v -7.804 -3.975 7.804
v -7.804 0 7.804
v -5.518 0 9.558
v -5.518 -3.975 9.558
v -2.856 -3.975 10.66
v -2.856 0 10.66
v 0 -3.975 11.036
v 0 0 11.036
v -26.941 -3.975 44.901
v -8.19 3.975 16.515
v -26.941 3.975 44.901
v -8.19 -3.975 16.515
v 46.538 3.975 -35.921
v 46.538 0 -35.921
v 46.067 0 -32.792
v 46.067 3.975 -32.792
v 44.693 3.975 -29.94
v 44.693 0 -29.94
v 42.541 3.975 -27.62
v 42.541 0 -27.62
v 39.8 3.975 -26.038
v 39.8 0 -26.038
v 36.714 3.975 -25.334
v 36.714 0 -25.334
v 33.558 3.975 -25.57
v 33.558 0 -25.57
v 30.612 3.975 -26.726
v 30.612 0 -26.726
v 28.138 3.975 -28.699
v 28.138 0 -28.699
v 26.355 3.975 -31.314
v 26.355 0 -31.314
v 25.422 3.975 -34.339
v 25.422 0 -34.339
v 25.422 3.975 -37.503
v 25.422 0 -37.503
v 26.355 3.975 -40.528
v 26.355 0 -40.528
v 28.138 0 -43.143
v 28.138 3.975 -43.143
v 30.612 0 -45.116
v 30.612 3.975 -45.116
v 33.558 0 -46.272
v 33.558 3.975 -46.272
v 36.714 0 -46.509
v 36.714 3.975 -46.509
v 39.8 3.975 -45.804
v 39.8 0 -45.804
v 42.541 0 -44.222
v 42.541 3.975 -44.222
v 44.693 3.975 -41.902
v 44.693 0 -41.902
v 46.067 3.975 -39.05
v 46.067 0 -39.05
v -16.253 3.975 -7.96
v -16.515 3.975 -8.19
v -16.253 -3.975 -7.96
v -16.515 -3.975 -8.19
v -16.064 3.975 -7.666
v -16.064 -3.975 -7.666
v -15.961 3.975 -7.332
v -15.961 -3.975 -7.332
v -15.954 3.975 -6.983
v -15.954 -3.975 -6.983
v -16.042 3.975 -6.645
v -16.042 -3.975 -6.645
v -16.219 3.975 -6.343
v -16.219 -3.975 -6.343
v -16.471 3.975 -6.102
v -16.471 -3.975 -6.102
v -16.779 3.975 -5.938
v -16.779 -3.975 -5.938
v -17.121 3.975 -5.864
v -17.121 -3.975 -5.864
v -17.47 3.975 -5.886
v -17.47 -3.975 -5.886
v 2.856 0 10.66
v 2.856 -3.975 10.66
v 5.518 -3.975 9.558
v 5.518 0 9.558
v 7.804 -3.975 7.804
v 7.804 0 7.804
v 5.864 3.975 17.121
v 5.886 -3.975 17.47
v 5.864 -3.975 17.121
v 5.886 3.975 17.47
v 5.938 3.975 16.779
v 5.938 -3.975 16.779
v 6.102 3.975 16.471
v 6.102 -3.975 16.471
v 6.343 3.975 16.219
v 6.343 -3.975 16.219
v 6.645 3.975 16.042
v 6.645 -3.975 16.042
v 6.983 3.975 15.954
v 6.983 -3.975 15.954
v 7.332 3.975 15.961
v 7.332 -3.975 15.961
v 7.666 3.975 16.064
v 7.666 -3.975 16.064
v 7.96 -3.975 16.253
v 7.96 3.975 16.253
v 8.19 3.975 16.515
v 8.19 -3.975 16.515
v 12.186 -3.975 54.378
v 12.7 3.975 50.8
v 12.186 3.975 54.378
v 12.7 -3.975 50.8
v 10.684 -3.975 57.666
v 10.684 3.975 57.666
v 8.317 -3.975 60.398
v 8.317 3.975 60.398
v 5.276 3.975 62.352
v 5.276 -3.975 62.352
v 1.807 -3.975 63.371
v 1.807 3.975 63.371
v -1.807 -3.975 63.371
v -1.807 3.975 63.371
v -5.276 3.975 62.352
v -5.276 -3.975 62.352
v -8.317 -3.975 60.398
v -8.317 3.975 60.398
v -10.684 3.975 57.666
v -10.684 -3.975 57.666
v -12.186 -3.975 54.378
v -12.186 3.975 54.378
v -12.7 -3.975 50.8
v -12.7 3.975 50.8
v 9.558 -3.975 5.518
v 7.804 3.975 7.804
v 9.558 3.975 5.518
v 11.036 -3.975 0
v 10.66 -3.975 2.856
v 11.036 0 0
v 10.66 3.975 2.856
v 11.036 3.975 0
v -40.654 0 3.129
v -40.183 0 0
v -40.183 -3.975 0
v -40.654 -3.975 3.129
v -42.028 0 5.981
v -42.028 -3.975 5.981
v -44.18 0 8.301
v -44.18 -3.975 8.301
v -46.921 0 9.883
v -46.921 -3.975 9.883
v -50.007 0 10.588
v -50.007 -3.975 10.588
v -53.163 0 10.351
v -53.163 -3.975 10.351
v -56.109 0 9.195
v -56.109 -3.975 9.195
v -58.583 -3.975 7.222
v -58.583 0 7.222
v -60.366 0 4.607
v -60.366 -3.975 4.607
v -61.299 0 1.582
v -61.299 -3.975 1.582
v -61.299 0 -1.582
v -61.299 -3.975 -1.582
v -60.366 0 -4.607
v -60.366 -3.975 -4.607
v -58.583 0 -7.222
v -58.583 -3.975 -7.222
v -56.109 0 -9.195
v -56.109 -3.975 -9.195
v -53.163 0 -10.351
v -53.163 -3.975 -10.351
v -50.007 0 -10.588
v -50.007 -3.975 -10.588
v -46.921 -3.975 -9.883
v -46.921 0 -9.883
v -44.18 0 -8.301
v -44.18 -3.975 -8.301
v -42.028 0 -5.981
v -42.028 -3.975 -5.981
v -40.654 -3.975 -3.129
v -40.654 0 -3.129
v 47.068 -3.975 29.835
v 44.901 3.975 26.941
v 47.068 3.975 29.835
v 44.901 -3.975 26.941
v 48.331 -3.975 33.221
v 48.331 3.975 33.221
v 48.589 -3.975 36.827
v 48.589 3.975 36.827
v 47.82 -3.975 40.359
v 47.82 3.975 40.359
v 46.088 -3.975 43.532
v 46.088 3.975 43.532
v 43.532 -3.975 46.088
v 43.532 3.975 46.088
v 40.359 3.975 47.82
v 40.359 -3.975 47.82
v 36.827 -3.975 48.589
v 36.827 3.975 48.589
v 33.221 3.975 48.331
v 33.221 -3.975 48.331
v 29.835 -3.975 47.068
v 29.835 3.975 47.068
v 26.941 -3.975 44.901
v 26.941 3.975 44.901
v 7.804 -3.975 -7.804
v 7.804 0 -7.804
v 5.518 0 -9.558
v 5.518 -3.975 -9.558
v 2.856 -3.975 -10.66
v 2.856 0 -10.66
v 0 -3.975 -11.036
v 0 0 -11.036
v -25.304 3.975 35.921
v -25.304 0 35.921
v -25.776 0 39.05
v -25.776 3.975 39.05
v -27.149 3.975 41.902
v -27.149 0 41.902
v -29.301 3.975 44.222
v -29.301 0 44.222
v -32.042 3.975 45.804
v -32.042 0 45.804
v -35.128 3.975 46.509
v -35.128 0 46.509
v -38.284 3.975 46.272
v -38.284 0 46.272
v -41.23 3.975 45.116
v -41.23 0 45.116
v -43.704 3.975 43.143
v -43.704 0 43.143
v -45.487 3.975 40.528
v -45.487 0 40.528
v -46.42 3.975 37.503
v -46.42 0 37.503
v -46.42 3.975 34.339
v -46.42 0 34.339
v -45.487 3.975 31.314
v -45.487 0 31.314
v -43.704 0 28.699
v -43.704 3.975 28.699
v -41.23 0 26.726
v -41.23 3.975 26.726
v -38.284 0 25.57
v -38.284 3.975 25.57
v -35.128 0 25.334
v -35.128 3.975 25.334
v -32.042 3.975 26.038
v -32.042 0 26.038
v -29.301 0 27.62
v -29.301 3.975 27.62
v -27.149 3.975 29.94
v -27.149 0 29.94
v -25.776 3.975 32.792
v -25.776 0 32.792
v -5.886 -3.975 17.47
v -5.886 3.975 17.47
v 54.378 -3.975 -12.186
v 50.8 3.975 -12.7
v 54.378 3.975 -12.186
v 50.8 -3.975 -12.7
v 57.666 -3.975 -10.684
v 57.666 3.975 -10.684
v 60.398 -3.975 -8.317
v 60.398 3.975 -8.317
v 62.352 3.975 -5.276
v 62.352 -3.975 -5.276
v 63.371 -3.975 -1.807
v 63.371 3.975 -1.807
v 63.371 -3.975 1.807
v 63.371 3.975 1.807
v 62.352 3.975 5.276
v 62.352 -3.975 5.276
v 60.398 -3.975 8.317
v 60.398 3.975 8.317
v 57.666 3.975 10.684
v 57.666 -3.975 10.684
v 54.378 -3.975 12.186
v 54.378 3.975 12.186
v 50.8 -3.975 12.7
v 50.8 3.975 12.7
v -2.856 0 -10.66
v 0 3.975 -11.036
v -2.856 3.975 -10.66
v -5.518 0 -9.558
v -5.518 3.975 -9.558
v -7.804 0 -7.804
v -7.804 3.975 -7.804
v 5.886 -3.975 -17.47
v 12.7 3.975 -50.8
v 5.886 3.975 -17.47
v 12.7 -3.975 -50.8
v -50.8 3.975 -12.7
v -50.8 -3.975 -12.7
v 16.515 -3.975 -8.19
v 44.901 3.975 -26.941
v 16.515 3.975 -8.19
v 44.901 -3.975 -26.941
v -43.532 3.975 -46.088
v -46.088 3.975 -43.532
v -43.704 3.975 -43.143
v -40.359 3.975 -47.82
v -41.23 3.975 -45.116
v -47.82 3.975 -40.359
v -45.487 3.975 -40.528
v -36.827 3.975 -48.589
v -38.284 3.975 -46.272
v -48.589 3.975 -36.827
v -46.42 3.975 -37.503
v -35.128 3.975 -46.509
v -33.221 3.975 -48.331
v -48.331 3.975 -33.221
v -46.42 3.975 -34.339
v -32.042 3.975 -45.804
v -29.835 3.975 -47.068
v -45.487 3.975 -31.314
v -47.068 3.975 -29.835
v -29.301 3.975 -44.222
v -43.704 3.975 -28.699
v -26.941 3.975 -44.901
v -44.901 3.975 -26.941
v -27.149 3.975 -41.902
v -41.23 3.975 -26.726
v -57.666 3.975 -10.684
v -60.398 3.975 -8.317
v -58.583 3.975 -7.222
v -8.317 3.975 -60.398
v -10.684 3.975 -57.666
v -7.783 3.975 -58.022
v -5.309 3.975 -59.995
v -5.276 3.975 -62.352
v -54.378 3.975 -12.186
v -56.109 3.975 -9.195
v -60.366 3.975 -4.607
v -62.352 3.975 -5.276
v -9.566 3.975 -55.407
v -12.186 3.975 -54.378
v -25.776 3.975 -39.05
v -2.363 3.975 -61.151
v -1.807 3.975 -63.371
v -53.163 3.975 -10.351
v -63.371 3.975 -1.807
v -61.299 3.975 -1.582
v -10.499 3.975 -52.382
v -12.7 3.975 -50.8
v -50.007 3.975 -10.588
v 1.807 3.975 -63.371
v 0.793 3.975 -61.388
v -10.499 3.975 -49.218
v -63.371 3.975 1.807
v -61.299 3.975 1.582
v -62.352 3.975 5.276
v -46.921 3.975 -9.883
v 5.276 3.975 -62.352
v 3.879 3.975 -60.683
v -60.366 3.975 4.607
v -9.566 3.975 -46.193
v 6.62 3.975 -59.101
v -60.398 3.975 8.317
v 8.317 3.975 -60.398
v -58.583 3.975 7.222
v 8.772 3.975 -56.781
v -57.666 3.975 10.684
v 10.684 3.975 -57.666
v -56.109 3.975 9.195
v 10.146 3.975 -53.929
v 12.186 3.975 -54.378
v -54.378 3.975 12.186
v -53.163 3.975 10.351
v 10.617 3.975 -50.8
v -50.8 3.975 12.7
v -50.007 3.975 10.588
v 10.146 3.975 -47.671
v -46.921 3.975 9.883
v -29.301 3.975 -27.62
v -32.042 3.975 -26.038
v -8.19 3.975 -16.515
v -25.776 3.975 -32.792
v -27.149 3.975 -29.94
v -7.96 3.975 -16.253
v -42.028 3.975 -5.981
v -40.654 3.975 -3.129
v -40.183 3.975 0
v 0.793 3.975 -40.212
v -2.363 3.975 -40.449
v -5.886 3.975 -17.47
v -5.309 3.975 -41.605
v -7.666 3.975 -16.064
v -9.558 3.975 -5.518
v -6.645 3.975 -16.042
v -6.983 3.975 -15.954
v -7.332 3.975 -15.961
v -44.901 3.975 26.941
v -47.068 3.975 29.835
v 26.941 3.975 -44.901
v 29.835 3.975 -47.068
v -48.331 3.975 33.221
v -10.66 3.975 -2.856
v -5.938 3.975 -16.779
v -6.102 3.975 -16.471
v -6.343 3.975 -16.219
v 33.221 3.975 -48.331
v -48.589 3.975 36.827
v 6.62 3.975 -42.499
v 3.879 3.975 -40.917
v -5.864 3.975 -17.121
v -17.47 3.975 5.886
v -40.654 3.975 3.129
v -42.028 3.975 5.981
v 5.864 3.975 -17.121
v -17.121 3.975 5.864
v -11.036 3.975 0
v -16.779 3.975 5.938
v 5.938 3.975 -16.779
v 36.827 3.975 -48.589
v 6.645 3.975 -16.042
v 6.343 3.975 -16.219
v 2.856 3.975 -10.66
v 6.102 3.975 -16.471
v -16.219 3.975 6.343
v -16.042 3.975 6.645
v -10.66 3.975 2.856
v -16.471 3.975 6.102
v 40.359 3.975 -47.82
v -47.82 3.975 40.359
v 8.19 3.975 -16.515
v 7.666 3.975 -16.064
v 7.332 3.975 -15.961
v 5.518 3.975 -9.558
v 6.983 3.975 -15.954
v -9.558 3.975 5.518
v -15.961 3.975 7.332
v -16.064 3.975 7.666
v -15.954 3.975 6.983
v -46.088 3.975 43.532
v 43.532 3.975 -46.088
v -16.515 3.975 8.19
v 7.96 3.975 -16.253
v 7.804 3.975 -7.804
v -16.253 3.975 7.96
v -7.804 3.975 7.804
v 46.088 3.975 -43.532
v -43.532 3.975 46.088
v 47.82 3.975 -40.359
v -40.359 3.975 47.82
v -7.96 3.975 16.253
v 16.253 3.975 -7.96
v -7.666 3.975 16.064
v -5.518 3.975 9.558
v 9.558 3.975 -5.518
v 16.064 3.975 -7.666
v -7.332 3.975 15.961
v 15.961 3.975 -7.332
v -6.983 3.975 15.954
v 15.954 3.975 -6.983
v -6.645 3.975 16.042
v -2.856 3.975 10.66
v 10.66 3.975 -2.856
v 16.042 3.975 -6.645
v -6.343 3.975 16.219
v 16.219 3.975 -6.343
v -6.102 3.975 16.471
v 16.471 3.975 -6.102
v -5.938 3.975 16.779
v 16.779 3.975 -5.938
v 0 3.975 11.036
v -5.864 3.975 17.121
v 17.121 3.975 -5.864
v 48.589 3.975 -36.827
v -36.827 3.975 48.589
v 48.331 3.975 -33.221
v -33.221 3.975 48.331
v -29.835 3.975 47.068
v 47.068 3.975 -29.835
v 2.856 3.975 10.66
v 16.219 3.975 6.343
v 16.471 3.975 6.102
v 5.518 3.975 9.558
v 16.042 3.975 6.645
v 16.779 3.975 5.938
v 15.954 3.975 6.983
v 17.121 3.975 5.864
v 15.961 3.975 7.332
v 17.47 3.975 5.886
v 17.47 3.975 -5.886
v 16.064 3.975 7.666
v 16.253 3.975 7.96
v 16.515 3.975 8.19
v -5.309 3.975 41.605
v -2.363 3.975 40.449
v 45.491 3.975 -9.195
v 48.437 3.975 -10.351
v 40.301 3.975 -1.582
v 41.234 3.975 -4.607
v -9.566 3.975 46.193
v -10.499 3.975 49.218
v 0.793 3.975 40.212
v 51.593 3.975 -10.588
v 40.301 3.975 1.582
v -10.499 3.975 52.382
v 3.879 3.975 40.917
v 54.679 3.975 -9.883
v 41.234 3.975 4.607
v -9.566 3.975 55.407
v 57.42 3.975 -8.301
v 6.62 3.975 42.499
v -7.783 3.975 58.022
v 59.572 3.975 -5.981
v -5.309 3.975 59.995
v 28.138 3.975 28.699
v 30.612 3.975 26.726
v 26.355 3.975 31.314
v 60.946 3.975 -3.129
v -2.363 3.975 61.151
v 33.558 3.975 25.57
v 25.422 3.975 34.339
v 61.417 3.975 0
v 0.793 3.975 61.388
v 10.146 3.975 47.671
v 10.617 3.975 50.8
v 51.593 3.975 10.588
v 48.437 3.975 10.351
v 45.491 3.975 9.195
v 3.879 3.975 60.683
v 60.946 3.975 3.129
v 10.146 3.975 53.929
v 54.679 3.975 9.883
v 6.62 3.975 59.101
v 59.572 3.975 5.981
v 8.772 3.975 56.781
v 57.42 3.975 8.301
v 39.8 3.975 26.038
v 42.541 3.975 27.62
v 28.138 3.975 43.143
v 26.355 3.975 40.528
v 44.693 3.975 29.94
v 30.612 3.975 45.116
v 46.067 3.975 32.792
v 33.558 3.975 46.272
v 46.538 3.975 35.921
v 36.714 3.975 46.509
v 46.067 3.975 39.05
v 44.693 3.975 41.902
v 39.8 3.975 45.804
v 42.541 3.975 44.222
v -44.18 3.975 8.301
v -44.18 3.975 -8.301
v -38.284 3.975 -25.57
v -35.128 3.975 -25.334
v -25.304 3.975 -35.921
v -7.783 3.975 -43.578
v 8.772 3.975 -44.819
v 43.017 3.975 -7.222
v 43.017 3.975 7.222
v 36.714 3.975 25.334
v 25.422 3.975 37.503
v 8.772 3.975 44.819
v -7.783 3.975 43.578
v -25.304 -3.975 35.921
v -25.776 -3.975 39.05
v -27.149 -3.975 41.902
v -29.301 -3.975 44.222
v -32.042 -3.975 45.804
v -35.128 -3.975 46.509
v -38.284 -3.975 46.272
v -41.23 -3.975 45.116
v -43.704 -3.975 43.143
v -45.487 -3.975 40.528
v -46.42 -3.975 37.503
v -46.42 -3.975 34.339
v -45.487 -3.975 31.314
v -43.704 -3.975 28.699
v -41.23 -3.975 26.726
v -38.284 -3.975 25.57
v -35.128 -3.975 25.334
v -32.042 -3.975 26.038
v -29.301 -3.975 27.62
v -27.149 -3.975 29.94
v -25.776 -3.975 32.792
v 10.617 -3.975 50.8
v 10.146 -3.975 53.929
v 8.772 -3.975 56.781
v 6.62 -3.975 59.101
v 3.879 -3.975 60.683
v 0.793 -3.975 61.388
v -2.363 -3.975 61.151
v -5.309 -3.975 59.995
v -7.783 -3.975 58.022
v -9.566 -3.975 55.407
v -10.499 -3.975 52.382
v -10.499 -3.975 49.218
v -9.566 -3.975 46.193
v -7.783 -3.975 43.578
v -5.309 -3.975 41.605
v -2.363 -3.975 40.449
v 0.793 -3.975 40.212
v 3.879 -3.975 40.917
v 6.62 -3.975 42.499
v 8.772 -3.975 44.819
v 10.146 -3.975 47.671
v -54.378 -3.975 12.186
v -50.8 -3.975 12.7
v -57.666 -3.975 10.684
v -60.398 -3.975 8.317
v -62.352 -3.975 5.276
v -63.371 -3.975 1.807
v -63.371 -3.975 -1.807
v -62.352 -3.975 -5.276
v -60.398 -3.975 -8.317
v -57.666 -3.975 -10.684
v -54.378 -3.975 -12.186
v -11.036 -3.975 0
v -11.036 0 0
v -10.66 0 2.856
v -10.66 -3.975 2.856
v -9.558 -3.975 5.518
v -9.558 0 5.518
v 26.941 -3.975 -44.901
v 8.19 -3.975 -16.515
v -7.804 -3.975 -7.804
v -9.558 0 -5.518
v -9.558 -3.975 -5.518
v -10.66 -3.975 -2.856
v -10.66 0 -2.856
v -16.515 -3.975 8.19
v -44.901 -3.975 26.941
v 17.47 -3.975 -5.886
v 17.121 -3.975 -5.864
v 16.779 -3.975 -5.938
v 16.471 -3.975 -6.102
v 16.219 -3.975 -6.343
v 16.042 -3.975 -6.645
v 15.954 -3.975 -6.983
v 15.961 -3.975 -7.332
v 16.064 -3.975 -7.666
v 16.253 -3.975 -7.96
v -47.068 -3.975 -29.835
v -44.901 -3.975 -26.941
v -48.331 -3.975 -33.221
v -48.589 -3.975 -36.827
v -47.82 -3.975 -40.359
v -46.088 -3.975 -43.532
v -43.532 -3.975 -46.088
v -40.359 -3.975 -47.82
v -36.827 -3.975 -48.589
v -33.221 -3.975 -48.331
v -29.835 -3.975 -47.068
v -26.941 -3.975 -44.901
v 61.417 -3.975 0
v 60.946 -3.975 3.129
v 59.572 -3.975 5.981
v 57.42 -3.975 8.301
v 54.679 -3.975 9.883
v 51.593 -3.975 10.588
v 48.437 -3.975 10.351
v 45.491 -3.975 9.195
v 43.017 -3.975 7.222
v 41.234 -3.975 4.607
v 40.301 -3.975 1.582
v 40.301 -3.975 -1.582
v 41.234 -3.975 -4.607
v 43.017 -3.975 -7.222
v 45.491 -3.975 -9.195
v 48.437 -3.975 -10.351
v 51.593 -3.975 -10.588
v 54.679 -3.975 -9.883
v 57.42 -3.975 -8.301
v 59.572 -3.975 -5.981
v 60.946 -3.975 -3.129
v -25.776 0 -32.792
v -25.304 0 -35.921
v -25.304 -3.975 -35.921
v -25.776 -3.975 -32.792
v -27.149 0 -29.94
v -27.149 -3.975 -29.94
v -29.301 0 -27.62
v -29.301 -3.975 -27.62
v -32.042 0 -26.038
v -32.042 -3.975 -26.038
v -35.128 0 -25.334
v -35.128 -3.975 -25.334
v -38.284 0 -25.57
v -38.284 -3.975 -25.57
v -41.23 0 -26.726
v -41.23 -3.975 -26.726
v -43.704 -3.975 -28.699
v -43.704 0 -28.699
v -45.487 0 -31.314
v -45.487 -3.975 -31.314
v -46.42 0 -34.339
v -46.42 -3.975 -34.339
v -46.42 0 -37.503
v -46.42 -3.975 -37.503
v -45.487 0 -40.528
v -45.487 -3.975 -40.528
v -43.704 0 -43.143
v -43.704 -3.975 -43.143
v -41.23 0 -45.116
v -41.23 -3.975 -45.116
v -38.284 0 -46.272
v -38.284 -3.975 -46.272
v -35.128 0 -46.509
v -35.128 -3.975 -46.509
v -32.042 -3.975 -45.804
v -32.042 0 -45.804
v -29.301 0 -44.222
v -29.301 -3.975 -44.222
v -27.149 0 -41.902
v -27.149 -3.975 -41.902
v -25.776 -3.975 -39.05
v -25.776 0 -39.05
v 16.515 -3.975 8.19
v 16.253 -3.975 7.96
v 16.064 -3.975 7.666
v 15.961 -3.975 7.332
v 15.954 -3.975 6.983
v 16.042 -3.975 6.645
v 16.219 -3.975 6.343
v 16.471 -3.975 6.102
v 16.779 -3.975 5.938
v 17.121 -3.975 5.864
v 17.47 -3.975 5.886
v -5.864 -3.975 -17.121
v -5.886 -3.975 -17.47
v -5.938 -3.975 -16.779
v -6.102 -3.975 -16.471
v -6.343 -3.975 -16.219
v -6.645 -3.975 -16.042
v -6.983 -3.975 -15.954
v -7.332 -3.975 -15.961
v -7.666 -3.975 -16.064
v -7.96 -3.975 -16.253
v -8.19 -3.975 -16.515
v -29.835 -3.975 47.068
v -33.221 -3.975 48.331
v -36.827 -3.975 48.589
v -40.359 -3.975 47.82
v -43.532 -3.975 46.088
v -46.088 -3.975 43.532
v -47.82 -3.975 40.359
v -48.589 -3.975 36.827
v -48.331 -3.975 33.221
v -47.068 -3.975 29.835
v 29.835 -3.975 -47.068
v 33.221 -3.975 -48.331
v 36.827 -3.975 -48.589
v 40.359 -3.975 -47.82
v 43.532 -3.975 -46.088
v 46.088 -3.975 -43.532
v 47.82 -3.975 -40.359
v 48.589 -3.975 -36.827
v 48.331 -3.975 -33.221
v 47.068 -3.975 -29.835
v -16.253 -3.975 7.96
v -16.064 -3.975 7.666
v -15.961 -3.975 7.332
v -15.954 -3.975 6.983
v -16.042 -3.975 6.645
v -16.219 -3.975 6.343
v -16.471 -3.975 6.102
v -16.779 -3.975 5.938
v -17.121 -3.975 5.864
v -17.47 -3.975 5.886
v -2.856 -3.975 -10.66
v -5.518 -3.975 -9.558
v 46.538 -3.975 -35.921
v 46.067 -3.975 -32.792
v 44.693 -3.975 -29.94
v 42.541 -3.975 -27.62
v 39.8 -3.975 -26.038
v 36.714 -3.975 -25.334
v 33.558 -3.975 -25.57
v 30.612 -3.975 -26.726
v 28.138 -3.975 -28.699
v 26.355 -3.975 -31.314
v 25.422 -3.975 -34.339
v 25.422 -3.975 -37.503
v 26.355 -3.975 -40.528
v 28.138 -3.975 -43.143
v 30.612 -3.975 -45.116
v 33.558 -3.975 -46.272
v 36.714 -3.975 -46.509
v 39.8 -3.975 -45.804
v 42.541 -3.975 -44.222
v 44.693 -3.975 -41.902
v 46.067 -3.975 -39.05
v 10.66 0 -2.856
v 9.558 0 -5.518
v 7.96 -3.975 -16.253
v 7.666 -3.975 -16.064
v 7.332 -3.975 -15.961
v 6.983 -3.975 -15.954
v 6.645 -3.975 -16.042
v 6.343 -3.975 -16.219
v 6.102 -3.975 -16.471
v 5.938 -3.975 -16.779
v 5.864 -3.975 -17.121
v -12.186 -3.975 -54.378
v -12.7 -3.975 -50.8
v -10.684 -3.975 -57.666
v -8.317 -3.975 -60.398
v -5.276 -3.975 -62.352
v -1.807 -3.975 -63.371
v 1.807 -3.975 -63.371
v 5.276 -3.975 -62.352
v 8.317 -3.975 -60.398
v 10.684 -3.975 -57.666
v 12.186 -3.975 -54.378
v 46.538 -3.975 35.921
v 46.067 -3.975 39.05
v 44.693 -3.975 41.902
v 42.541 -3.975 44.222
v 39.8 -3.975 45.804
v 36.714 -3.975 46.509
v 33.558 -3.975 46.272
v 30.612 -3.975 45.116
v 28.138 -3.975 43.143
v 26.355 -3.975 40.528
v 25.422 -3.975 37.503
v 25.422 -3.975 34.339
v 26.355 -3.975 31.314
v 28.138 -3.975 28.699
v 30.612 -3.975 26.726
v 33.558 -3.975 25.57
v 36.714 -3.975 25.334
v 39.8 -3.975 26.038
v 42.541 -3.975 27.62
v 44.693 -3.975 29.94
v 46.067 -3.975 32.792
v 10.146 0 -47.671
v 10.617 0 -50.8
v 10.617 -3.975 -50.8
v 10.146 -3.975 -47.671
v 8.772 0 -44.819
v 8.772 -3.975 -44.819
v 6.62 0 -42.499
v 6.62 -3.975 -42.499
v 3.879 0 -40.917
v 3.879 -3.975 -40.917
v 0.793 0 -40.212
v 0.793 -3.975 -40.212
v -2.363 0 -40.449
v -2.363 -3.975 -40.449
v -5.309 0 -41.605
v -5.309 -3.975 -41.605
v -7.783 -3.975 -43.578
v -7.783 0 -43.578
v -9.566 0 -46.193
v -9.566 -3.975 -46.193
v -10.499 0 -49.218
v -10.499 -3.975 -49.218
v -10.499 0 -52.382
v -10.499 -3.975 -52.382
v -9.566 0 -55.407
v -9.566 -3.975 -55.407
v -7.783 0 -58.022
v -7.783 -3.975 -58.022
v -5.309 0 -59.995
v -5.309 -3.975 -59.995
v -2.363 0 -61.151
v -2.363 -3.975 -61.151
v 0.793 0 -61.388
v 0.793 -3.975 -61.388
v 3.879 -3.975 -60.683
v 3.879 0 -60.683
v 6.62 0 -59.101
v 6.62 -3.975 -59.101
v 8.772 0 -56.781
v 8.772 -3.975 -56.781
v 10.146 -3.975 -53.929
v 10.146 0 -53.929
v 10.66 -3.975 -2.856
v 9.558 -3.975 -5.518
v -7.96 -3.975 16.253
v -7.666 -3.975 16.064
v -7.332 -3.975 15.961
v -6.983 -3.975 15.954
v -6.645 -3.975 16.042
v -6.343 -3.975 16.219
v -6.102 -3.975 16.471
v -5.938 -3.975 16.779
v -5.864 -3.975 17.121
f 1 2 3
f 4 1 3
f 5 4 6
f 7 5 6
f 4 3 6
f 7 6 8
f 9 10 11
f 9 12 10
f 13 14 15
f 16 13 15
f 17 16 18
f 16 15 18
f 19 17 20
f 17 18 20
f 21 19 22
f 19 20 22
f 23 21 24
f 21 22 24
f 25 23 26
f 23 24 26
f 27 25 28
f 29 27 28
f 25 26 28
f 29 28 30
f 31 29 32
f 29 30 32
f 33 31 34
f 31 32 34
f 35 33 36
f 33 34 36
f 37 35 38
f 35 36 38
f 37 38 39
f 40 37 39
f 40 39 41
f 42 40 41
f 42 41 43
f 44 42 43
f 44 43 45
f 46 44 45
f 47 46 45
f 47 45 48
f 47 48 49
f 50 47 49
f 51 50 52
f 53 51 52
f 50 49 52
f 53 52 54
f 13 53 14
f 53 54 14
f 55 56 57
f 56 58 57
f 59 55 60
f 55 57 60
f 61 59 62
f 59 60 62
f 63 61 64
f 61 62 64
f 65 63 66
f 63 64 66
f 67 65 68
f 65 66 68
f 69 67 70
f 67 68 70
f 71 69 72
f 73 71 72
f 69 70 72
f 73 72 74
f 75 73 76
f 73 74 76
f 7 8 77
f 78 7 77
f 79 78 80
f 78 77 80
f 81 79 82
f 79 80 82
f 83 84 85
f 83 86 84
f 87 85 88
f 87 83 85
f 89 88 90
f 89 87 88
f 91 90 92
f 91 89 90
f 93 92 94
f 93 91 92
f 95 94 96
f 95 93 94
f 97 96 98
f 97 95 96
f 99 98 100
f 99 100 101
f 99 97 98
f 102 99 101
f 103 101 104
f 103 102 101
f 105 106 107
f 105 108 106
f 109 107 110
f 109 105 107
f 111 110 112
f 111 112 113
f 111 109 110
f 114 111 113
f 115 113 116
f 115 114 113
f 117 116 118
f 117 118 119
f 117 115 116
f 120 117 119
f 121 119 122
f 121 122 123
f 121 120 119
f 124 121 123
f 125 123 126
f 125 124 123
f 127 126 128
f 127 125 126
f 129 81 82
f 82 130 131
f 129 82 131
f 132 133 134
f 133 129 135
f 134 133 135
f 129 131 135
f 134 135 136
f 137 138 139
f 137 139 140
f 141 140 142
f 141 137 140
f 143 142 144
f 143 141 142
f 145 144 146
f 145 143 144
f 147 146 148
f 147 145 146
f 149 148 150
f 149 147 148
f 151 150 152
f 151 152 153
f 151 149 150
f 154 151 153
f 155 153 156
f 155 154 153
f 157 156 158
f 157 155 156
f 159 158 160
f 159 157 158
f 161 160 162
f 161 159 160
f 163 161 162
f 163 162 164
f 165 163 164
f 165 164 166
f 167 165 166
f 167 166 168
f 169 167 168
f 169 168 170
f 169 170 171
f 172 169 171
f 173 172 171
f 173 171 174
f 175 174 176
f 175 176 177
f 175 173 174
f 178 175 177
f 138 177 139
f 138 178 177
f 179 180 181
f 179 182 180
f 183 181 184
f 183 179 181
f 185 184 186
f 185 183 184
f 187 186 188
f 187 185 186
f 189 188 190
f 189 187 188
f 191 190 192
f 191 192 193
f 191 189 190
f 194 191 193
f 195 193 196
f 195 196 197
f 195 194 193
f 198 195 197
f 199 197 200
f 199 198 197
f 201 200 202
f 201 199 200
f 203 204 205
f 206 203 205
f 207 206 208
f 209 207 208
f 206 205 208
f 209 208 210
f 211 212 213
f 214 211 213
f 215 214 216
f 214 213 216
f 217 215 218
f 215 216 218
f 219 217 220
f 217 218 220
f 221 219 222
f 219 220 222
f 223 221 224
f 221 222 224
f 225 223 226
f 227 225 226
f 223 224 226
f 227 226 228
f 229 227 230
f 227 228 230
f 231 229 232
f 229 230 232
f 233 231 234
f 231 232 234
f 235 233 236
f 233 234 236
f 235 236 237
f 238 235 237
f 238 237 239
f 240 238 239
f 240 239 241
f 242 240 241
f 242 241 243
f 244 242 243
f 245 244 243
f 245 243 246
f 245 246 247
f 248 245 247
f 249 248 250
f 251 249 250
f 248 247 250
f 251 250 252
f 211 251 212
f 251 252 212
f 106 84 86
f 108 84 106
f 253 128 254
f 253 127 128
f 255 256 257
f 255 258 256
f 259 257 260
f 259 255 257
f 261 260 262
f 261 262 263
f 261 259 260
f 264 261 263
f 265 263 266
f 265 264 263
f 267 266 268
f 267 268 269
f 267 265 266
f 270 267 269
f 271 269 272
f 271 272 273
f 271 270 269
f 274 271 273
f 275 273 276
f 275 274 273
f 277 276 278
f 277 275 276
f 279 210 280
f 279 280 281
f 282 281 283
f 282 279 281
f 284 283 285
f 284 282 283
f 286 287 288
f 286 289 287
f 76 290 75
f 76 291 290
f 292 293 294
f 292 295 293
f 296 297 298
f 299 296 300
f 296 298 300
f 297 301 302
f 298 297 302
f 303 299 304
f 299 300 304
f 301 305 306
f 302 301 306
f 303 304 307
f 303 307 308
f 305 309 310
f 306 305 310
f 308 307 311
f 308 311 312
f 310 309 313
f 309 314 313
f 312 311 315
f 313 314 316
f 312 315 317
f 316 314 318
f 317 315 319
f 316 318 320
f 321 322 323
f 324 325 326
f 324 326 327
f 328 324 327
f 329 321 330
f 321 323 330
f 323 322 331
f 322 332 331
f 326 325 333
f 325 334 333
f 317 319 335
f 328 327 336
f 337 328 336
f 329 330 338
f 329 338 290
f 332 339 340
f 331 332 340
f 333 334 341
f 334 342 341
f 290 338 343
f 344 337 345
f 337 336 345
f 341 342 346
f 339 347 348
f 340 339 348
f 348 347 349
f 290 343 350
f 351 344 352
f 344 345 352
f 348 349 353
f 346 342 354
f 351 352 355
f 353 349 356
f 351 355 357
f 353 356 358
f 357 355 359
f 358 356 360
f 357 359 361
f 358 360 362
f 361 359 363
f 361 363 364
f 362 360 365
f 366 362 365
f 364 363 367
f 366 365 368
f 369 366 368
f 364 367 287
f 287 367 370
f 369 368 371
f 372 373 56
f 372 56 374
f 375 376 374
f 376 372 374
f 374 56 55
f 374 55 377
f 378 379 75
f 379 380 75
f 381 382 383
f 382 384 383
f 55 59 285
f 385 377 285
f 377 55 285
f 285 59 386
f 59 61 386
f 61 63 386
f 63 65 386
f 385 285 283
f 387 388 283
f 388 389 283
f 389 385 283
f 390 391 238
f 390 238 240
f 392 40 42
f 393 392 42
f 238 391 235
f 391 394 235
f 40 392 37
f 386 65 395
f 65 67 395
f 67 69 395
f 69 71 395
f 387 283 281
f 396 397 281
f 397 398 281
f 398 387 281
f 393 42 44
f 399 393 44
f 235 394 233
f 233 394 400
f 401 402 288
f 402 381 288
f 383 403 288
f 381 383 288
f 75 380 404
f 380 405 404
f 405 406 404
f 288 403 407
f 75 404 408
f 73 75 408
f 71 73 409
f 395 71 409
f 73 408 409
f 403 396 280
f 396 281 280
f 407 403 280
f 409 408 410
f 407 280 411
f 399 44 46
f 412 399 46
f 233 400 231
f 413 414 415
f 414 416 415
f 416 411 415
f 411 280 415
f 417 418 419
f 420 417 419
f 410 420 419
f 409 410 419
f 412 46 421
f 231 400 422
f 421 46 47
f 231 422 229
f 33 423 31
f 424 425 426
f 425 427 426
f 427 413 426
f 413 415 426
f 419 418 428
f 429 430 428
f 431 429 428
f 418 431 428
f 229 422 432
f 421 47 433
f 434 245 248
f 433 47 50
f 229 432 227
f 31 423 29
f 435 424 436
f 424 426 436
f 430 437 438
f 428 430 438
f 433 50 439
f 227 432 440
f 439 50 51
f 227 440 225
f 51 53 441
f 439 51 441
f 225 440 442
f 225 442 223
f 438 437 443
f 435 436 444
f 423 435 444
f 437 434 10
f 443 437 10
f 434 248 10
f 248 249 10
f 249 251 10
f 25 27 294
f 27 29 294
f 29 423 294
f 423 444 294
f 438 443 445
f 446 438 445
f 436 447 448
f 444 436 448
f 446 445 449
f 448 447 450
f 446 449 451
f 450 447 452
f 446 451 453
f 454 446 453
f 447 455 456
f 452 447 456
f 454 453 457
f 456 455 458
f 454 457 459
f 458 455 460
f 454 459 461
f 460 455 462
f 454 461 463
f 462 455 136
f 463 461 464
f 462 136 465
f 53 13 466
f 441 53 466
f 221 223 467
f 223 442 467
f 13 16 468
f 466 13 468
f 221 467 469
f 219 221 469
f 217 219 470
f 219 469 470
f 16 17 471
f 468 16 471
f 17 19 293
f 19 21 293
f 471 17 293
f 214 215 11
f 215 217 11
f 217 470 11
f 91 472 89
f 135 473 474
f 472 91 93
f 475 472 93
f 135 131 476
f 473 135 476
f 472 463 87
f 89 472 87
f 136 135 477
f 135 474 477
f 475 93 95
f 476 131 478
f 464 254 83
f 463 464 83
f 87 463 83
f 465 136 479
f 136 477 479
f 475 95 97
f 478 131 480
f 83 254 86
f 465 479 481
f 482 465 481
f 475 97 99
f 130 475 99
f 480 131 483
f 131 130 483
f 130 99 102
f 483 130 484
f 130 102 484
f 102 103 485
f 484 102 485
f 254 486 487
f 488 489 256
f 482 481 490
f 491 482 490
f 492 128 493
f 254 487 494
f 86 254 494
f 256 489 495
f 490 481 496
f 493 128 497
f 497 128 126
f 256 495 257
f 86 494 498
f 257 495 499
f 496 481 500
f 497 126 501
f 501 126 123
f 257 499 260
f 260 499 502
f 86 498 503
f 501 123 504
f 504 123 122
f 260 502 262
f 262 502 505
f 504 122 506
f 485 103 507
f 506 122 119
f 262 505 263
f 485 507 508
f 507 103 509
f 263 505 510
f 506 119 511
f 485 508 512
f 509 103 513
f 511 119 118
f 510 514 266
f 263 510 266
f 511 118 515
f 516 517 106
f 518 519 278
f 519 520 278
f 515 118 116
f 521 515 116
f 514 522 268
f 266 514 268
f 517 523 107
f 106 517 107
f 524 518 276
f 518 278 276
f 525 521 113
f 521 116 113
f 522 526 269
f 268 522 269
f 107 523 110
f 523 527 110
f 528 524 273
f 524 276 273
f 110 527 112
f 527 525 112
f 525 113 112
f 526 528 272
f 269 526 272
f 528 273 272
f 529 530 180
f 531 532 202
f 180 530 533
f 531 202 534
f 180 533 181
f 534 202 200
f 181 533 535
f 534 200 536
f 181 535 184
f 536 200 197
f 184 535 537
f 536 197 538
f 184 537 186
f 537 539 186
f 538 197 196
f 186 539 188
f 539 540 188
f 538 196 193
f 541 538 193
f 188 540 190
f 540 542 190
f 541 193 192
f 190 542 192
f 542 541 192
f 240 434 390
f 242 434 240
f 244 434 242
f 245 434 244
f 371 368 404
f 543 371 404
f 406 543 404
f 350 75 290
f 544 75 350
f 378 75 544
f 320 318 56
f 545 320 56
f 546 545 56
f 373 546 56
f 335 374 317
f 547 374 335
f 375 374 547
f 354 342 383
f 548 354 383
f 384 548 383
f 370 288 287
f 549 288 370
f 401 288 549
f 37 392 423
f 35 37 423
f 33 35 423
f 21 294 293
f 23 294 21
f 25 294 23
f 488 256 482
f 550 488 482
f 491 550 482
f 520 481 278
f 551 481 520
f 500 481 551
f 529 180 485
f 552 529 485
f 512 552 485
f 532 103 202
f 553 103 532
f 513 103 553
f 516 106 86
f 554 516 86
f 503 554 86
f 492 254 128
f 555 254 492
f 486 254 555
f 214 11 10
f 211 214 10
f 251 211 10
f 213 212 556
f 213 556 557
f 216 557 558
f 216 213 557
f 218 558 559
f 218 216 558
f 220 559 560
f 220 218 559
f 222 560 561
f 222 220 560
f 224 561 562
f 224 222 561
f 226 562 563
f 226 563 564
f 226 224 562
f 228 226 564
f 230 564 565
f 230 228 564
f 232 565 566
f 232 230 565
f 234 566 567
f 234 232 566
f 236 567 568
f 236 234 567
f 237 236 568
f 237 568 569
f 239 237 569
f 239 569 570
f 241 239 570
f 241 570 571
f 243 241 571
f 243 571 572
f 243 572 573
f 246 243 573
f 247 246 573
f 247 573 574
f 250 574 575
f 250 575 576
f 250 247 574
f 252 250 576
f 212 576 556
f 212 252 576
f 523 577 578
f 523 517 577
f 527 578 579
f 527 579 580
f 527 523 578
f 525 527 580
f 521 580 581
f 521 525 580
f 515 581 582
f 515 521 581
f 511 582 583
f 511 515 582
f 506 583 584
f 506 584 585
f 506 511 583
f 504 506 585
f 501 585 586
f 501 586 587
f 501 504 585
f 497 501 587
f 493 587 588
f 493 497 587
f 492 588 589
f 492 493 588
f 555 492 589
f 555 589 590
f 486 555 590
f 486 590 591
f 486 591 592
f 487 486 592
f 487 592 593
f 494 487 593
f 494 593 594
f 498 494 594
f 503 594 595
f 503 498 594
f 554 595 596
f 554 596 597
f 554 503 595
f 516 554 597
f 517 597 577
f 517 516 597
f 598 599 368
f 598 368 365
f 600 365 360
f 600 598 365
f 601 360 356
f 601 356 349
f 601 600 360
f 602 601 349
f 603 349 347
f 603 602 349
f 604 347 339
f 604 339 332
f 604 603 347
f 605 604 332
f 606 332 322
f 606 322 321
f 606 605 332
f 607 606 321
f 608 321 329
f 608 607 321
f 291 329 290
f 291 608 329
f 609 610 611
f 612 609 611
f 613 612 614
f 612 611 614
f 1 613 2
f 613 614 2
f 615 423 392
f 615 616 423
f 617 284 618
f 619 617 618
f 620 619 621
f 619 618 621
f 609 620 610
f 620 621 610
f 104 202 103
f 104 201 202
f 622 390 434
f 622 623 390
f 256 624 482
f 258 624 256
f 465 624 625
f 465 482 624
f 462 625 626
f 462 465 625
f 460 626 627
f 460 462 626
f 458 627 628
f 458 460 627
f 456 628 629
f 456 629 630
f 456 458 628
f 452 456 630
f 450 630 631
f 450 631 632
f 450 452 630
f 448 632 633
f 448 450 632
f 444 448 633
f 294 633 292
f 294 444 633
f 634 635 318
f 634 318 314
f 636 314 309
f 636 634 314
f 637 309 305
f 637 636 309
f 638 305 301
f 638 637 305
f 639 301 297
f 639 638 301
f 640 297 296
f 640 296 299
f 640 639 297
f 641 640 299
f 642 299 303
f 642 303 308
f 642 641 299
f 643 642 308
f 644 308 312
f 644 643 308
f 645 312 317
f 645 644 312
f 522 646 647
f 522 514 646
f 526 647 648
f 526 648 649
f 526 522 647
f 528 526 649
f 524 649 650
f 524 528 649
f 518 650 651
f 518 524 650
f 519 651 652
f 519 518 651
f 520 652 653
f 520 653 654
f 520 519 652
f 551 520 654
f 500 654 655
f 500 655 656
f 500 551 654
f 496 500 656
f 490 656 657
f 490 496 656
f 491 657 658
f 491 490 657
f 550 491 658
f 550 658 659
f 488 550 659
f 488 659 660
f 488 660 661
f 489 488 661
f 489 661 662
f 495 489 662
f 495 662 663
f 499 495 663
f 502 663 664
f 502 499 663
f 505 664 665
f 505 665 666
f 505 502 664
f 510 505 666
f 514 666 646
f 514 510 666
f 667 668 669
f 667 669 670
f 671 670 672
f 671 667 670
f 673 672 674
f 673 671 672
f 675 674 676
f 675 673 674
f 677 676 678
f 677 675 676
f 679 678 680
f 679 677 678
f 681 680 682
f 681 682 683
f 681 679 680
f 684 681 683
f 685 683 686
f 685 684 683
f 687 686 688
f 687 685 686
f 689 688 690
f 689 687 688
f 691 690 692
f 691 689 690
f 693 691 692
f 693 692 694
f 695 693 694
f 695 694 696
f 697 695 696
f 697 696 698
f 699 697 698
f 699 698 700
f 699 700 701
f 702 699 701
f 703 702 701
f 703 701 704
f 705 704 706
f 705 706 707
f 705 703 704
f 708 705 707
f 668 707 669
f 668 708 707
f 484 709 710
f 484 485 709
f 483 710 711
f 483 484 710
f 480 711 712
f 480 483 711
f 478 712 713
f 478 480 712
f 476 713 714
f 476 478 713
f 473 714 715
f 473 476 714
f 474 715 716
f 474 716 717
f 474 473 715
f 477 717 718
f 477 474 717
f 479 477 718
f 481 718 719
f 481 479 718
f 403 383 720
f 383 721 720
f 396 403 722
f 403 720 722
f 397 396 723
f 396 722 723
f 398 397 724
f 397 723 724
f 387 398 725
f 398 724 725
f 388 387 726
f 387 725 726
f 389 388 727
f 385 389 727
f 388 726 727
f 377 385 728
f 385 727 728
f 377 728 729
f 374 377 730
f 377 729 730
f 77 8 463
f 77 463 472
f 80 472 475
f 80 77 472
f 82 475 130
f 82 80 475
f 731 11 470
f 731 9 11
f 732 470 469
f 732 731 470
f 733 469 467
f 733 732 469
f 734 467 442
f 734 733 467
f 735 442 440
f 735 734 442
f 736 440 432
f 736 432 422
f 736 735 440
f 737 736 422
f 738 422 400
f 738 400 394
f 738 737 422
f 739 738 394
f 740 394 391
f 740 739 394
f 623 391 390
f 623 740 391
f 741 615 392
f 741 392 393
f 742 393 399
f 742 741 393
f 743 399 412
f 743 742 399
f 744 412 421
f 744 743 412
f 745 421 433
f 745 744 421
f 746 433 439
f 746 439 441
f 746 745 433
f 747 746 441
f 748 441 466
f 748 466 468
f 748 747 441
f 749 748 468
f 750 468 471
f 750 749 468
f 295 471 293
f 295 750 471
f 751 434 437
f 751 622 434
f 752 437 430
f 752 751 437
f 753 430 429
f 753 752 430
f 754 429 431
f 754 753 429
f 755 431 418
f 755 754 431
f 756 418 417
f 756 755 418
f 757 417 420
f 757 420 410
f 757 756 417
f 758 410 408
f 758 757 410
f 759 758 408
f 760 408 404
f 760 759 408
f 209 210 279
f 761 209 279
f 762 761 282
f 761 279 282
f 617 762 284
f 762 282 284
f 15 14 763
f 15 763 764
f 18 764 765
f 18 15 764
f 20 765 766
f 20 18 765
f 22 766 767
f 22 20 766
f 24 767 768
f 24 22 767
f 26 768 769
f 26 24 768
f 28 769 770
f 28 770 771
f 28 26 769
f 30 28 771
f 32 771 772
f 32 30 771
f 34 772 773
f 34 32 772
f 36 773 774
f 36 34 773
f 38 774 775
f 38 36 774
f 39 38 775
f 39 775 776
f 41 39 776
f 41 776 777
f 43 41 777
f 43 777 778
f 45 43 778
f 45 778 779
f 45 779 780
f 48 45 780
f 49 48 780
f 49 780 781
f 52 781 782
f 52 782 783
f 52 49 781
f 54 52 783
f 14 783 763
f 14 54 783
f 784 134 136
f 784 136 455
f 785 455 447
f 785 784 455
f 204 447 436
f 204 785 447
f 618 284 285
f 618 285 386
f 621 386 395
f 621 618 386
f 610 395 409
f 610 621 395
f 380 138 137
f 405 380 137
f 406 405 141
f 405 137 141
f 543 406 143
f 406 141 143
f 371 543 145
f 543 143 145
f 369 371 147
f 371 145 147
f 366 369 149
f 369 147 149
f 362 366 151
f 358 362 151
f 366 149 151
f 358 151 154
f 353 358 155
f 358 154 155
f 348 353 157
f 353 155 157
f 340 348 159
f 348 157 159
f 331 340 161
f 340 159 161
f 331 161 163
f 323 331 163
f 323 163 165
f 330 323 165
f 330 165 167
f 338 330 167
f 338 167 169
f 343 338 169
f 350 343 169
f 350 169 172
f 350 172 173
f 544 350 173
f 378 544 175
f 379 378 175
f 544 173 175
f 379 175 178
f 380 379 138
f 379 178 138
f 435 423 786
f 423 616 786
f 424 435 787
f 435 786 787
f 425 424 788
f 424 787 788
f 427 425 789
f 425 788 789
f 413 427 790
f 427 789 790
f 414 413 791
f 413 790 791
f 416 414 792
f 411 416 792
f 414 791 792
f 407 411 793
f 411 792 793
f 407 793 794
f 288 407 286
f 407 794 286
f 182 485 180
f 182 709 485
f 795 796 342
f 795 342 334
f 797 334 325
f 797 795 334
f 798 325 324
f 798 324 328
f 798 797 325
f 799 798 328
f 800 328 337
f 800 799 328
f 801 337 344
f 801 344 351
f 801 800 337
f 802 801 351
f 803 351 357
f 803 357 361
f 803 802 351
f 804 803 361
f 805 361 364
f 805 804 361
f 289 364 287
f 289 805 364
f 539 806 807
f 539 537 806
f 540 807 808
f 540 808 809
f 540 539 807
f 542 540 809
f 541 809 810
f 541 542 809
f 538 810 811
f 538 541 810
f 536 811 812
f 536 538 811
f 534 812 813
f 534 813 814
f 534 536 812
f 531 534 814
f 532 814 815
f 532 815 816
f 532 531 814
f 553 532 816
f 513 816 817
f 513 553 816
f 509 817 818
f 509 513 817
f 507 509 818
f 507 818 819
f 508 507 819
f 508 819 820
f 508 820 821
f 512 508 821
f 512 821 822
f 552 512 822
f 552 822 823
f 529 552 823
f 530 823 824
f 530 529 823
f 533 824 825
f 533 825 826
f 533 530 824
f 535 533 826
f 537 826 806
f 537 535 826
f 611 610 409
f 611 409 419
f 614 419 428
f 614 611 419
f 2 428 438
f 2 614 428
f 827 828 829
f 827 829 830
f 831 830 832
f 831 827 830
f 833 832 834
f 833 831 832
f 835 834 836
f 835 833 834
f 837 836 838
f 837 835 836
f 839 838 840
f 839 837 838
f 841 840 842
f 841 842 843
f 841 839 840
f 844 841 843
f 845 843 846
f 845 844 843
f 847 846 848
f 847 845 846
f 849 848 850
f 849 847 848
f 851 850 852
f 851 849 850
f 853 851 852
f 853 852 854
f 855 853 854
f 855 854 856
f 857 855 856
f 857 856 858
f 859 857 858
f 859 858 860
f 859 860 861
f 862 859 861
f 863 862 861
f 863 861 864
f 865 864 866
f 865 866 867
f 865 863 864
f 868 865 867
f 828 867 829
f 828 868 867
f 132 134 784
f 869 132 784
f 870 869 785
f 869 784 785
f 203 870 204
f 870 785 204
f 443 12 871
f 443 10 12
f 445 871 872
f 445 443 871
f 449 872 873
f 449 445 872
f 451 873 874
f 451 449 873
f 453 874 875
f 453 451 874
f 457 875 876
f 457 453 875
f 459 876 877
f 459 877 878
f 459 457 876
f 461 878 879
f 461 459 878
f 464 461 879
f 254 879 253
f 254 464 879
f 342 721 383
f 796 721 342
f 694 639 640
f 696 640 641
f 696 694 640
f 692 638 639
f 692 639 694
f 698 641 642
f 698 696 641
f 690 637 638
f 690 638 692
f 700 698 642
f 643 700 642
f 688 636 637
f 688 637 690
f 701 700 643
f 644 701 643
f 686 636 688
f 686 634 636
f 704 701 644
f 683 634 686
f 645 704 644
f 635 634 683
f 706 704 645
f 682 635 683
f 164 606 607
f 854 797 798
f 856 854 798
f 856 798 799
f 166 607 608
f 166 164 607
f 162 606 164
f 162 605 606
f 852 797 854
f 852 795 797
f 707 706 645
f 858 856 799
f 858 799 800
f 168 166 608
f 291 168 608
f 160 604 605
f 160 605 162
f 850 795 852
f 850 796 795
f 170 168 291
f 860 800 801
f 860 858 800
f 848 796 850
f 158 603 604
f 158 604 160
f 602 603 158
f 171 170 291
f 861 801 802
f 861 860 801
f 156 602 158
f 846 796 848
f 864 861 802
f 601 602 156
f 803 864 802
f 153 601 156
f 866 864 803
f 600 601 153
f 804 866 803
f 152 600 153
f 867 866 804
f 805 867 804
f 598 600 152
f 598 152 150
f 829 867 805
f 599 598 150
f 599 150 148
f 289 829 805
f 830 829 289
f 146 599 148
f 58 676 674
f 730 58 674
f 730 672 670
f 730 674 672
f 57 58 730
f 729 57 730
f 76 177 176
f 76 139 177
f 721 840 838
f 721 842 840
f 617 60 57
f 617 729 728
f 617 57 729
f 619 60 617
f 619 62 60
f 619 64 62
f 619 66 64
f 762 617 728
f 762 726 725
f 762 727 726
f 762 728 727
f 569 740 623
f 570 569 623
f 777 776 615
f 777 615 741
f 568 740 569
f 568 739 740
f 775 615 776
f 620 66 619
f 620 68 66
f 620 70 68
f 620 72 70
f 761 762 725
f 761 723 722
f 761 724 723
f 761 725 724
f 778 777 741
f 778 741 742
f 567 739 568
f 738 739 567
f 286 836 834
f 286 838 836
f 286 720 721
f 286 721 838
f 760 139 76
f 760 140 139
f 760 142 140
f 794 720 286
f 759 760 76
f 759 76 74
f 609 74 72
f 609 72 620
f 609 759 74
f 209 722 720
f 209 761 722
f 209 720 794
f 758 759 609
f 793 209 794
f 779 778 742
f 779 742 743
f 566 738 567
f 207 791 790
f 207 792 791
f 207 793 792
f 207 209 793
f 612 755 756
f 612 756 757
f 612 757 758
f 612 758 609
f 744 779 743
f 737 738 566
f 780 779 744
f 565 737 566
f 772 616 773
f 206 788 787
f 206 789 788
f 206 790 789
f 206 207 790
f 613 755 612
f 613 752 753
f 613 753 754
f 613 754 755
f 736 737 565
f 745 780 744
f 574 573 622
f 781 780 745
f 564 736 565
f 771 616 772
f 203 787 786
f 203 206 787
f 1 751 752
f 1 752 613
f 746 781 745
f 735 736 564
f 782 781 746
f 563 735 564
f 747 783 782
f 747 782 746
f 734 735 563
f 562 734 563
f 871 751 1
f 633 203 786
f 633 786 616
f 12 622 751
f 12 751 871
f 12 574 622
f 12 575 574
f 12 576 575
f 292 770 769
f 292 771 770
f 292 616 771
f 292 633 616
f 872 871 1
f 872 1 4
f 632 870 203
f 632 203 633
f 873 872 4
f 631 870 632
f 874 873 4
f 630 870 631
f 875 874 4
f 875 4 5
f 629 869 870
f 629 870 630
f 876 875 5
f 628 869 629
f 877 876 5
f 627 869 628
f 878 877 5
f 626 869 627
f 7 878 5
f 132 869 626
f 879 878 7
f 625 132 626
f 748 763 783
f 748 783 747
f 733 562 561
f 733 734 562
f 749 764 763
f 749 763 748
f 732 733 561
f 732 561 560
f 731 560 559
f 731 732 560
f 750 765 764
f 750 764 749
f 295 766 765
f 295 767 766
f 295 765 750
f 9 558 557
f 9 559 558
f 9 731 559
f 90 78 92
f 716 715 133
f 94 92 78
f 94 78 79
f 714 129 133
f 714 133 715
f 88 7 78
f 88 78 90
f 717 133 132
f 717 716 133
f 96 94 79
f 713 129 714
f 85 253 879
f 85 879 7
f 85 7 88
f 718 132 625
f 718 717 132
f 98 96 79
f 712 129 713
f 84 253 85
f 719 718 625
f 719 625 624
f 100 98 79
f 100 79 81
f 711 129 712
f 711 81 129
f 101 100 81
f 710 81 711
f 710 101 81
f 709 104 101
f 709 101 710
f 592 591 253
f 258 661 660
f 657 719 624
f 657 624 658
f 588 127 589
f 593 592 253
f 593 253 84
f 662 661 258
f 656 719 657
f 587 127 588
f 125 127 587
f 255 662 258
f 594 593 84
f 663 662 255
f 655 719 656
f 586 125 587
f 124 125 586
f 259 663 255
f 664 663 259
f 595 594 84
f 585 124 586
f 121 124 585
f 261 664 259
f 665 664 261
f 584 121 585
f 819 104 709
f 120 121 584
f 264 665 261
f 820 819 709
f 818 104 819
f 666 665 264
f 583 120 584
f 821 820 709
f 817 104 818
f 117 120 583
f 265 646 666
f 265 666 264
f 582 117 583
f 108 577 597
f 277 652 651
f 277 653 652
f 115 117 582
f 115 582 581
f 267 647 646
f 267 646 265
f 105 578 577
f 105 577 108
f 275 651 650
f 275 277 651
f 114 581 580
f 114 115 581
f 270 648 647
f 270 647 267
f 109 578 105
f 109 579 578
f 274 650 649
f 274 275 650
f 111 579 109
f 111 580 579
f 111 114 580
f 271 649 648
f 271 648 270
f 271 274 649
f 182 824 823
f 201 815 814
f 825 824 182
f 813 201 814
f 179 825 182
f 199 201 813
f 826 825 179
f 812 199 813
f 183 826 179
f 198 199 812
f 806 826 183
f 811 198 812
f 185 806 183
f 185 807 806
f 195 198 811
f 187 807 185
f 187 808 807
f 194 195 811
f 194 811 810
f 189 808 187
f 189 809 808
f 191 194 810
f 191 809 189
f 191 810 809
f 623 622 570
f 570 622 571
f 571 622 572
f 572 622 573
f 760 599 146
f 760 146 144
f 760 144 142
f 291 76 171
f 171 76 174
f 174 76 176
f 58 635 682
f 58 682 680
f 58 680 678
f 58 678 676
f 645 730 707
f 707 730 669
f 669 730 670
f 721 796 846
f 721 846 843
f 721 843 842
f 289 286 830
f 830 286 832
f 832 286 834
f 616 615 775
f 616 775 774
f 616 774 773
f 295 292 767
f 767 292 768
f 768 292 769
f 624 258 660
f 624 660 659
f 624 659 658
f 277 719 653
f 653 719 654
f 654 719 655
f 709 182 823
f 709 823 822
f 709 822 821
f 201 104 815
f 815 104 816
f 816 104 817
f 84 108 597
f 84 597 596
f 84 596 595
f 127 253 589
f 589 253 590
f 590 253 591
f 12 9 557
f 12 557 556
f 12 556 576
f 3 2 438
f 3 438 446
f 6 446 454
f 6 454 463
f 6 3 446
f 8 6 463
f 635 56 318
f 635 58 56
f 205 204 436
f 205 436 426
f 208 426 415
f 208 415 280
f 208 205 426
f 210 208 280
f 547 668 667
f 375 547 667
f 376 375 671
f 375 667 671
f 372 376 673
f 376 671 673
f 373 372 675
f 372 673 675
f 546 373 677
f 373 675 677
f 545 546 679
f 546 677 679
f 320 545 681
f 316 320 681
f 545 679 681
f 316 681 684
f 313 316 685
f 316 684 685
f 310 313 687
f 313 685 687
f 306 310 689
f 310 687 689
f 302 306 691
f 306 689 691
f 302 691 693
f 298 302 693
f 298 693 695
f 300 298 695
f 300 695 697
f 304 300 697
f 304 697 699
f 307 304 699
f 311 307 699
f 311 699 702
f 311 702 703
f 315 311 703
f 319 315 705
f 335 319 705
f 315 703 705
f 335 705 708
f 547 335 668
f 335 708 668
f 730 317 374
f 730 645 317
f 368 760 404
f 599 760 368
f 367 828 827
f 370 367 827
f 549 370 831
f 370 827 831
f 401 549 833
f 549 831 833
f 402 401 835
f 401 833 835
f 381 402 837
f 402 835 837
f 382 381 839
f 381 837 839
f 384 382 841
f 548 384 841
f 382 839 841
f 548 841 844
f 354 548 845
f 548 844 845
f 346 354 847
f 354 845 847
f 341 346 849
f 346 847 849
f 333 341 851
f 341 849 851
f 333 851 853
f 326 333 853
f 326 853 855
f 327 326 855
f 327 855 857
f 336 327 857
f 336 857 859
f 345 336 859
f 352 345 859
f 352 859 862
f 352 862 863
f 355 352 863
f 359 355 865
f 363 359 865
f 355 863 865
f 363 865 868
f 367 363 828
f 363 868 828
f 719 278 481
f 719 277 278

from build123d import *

# Parameters (mm, degrees)
F0_R     = 10.6172
F1_DEPTH = 3.9751
F2_R     = 1.27


with BuildPart() as f1:
    # F0 (on Front) → F1 (new body, symmetric)
    with BuildSketch(Plane.XZ):
        with BuildLine():
            Line((11.0363, -4.5713851384), (11.0363, 0))
            ThreePointArc((11.0363, 0), (10.1962116818, -4.2234091715), (7.8038425587, -7.8038425798))
            Line((7.8038425587, -7.8038425798), (11.0363, -4.5713851384))
        make_face()
        with BuildLine():
            ThreePointArc((7.8038425896, 7.8038425488), (10.1962116902, 4.2234091513), (11.0363, 0))
            Line((11.0363, 0), (11.0363, 4.5713851384))
            Line((11.0363, 4.5713851384), (7.8038425896, 7.8038425488))
        make_face()
        with BuildLine():
            Line((11.0363, 4.5713851384), (11.0363, 0))
            Line((11.0363, 0), (11.0363, -4.5713851384))
            Line((11.0363, -4.5713851384), (50.8, -12.7))
            ThreePointArc((50.8, -12.7), (63.5, 0), (50.8, 12.7))
            Line((50.8, 12.7), (11.0363, 4.5713851384))
        make_face()
        with Locations((50.8, 0)):
            Circle(F0_R, mode=Mode.SUBTRACT)
        with BuildLine():
            ThreePointArc((0, 11.0363), (4.2234091779, 10.1962116791), (7.8038425896, 7.8038425488))
            Line((7.8038425896, 7.8038425488), (4.5713851384, 11.0363))
            Line((4.5713851384, 11.0363), (0, 11.0363))
        make_face()
        with BuildLine():
            Line((4.5713851384, 11.0363), (7.8038425896, 7.8038425488))
            Line((7.8038425896, 7.8038425488), (11.0363, 4.5713851384))
            Line((11.0363, 4.5713851384), (44.9012806053, 26.9407683632))
            ThreePointArc((44.9012806053, 26.9407683632), (44.9012806053, 44.9012806053), (26.9407683632, 44.9012806053))
            Line((26.9407683632, 44.9012806053), (4.5713851384, 11.0363))
        make_face()
        with Locations((35.9210244843, 35.9210244843)):
            Circle(F0_R, mode=Mode.SUBTRACT)
        with BuildLine():
            Line((4.5713851384, -11.0363), (7.8038425587, -7.8038425798))
            ThreePointArc((7.8038425587, -7.8038425798), (4.2234091577, -10.1962116875), (0, -11.0363))
            Line((0, -11.0363), (4.5713851384, -11.0363))
        make_face()
        with BuildLine():
            Line((11.0363, -4.5713851384), (7.8038425587, -7.8038425798))
            Line((7.8038425587, -7.8038425798), (4.5713851384, -11.0363))
            Line((4.5713851384, -11.0363), (26.9407683632, -44.9012806053))
            ThreePointArc((26.9407683632, -44.9012806053), (44.9012806053, -44.9012806053), (44.9012806053, -26.9407683632))
            Line((44.9012806053, -26.9407683632), (11.0363, -4.5713851384))
        make_face()
        with Locations((35.9210244843, -35.9210244843)):
            Circle(F0_R, mode=Mode.SUBTRACT)
        with BuildLine():
            ThreePointArc((-7.8038425634, 7.803842575), (-4.2234091608, 10.1962116862), (0, 11.0363))
            Line((0, 11.0363), (-4.5713851384, 11.0363))
            Line((-4.5713851384, 11.0363), (-7.8038425634, 7.803842575))
        make_face()
        with BuildLine():
            Line((-4.5713851384, 11.0363), (0, 11.0363))
            Line((0, 11.0363), (4.5713851384, 11.0363))
            Line((4.5713851384, 11.0363), (12.7, 50.8))
            ThreePointArc((12.7, 50.8), (0, 63.5), (-12.7, 50.8))
            Line((-12.7, 50.8), (-4.5713851384, 11.0363))
        make_face()
        with Locations((0, 50.8)):
            Circle(F0_R, mode=Mode.SUBTRACT)
        with BuildLine():
            Line((-4.5713851384, -11.0363), (0, -11.0363))
            ThreePointArc((0, -11.0363), (-4.2234091646, -10.1962116847), (-7.8038425692, -7.8038425692))
            Line((-7.8038425692, -7.8038425692), (-4.5713851384, -11.0363))
        make_face()
        with BuildLine():
            Line((4.5713851384, -11.0363), (0, -11.0363))
            Line((0, -11.0363), (-4.5713851384, -11.0363))
            Line((-4.5713851384, -11.0363), (-12.7, -50.8))
            ThreePointArc((-12.7, -50.8), (0, -63.5), (12.7, -50.8))
            Line((12.7, -50.8), (4.5713851384, -11.0363))
        make_face()
        with Locations((0, -50.8)):
            Circle(F0_R, mode=Mode.SUBTRACT)
        with BuildLine():
            ThreePointArc((-11.0363, 0), (-10.1962116831, 4.2234091684), (-7.8038425634, 7.803842575))
            Line((-7.8038425634, 7.803842575), (-11.0363, 4.5713851384))
            Line((-11.0363, 4.5713851384), (-11.0363, 0))
        make_face()
        with BuildLine():
            Line((-11.0363, 4.5713851384), (-7.8038425634, 7.803842575))
            Line((-7.8038425634, 7.803842575), (-4.5713851384, 11.0363))
            Line((-4.5713851384, 11.0363), (-26.9407683632, 44.9012806053))
            ThreePointArc((-26.9407683632, 44.9012806053), (-44.9012806053, 44.9012806053), (-44.9012806053, 26.9407683632))
            Line((-44.9012806053, 26.9407683632), (-11.0363, 4.5713851384))
        make_face()
        with Locations((-35.9210244843, 35.9210244843)):
            Circle(F0_R, mode=Mode.SUBTRACT)
        with BuildLine():
            Line((-11.0363, -4.5713851384), (-7.8038425692, -7.8038425692))
            ThreePointArc((-7.8038425692, -7.8038425692), (-10.1962116847, -4.2234091646), (-11.0363, 0))
            Line((-11.0363, 0), (-11.0363, -4.5713851384))
        make_face()
        with BuildLine():
            Line((-4.5713851384, -11.0363), (-7.8038425692, -7.8038425692))
            Line((-7.8038425692, -7.8038425692), (-11.0363, -4.5713851384))
            Line((-11.0363, -4.5713851384), (-44.9012806053, -26.9407683632))
            ThreePointArc((-44.9012806053, -26.9407683632), (-44.9012806053, -44.9012806053), (-26.9407683632, -44.9012806053))
            Line((-26.9407683632, -44.9012806053), (-4.5713851384, -11.0363))
        make_face()
        with Locations((-35.9210244843, -35.9210244843)):
            Circle(F0_R, mode=Mode.SUBTRACT)
        with BuildLine():
            Line((-11.0363, -4.5713851384), (-11.0363, 0))
            Line((-11.0363, 0), (-11.0363, 4.5713851384))
            Line((-11.0363, 4.5713851384), (-50.8, 12.7))
            ThreePointArc((-50.8, 12.7), (-63.5, 0), (-50.8, -12.7))
            Line((-50.8, -12.7), (-11.0363, -4.5713851384))
        make_face()
        with Locations((-50.8, 0)):
            Circle(F0_R, mode=Mode.SUBTRACT)
    extrude(amount=F1_DEPTH, both=True)

    # F2
    f2_edges = [f1.edges().sort_by_distance(p)[0] for p in [
        (4.571385, 0, 11.0363),
        (-4.571385, 0, 11.0363),
        (-11.0363, 0, 4.571385),
        (-11.0363, 0, -4.571385),
        (-4.571385, 0, -11.0363),
        (4.571385, 0, -11.0363),
        (11.0363, 0, -4.571385),
        (11.0363, 0, 4.571385),
    ]]
    fillet(f2_edges, radius=F2_R)


solid = f1.part
